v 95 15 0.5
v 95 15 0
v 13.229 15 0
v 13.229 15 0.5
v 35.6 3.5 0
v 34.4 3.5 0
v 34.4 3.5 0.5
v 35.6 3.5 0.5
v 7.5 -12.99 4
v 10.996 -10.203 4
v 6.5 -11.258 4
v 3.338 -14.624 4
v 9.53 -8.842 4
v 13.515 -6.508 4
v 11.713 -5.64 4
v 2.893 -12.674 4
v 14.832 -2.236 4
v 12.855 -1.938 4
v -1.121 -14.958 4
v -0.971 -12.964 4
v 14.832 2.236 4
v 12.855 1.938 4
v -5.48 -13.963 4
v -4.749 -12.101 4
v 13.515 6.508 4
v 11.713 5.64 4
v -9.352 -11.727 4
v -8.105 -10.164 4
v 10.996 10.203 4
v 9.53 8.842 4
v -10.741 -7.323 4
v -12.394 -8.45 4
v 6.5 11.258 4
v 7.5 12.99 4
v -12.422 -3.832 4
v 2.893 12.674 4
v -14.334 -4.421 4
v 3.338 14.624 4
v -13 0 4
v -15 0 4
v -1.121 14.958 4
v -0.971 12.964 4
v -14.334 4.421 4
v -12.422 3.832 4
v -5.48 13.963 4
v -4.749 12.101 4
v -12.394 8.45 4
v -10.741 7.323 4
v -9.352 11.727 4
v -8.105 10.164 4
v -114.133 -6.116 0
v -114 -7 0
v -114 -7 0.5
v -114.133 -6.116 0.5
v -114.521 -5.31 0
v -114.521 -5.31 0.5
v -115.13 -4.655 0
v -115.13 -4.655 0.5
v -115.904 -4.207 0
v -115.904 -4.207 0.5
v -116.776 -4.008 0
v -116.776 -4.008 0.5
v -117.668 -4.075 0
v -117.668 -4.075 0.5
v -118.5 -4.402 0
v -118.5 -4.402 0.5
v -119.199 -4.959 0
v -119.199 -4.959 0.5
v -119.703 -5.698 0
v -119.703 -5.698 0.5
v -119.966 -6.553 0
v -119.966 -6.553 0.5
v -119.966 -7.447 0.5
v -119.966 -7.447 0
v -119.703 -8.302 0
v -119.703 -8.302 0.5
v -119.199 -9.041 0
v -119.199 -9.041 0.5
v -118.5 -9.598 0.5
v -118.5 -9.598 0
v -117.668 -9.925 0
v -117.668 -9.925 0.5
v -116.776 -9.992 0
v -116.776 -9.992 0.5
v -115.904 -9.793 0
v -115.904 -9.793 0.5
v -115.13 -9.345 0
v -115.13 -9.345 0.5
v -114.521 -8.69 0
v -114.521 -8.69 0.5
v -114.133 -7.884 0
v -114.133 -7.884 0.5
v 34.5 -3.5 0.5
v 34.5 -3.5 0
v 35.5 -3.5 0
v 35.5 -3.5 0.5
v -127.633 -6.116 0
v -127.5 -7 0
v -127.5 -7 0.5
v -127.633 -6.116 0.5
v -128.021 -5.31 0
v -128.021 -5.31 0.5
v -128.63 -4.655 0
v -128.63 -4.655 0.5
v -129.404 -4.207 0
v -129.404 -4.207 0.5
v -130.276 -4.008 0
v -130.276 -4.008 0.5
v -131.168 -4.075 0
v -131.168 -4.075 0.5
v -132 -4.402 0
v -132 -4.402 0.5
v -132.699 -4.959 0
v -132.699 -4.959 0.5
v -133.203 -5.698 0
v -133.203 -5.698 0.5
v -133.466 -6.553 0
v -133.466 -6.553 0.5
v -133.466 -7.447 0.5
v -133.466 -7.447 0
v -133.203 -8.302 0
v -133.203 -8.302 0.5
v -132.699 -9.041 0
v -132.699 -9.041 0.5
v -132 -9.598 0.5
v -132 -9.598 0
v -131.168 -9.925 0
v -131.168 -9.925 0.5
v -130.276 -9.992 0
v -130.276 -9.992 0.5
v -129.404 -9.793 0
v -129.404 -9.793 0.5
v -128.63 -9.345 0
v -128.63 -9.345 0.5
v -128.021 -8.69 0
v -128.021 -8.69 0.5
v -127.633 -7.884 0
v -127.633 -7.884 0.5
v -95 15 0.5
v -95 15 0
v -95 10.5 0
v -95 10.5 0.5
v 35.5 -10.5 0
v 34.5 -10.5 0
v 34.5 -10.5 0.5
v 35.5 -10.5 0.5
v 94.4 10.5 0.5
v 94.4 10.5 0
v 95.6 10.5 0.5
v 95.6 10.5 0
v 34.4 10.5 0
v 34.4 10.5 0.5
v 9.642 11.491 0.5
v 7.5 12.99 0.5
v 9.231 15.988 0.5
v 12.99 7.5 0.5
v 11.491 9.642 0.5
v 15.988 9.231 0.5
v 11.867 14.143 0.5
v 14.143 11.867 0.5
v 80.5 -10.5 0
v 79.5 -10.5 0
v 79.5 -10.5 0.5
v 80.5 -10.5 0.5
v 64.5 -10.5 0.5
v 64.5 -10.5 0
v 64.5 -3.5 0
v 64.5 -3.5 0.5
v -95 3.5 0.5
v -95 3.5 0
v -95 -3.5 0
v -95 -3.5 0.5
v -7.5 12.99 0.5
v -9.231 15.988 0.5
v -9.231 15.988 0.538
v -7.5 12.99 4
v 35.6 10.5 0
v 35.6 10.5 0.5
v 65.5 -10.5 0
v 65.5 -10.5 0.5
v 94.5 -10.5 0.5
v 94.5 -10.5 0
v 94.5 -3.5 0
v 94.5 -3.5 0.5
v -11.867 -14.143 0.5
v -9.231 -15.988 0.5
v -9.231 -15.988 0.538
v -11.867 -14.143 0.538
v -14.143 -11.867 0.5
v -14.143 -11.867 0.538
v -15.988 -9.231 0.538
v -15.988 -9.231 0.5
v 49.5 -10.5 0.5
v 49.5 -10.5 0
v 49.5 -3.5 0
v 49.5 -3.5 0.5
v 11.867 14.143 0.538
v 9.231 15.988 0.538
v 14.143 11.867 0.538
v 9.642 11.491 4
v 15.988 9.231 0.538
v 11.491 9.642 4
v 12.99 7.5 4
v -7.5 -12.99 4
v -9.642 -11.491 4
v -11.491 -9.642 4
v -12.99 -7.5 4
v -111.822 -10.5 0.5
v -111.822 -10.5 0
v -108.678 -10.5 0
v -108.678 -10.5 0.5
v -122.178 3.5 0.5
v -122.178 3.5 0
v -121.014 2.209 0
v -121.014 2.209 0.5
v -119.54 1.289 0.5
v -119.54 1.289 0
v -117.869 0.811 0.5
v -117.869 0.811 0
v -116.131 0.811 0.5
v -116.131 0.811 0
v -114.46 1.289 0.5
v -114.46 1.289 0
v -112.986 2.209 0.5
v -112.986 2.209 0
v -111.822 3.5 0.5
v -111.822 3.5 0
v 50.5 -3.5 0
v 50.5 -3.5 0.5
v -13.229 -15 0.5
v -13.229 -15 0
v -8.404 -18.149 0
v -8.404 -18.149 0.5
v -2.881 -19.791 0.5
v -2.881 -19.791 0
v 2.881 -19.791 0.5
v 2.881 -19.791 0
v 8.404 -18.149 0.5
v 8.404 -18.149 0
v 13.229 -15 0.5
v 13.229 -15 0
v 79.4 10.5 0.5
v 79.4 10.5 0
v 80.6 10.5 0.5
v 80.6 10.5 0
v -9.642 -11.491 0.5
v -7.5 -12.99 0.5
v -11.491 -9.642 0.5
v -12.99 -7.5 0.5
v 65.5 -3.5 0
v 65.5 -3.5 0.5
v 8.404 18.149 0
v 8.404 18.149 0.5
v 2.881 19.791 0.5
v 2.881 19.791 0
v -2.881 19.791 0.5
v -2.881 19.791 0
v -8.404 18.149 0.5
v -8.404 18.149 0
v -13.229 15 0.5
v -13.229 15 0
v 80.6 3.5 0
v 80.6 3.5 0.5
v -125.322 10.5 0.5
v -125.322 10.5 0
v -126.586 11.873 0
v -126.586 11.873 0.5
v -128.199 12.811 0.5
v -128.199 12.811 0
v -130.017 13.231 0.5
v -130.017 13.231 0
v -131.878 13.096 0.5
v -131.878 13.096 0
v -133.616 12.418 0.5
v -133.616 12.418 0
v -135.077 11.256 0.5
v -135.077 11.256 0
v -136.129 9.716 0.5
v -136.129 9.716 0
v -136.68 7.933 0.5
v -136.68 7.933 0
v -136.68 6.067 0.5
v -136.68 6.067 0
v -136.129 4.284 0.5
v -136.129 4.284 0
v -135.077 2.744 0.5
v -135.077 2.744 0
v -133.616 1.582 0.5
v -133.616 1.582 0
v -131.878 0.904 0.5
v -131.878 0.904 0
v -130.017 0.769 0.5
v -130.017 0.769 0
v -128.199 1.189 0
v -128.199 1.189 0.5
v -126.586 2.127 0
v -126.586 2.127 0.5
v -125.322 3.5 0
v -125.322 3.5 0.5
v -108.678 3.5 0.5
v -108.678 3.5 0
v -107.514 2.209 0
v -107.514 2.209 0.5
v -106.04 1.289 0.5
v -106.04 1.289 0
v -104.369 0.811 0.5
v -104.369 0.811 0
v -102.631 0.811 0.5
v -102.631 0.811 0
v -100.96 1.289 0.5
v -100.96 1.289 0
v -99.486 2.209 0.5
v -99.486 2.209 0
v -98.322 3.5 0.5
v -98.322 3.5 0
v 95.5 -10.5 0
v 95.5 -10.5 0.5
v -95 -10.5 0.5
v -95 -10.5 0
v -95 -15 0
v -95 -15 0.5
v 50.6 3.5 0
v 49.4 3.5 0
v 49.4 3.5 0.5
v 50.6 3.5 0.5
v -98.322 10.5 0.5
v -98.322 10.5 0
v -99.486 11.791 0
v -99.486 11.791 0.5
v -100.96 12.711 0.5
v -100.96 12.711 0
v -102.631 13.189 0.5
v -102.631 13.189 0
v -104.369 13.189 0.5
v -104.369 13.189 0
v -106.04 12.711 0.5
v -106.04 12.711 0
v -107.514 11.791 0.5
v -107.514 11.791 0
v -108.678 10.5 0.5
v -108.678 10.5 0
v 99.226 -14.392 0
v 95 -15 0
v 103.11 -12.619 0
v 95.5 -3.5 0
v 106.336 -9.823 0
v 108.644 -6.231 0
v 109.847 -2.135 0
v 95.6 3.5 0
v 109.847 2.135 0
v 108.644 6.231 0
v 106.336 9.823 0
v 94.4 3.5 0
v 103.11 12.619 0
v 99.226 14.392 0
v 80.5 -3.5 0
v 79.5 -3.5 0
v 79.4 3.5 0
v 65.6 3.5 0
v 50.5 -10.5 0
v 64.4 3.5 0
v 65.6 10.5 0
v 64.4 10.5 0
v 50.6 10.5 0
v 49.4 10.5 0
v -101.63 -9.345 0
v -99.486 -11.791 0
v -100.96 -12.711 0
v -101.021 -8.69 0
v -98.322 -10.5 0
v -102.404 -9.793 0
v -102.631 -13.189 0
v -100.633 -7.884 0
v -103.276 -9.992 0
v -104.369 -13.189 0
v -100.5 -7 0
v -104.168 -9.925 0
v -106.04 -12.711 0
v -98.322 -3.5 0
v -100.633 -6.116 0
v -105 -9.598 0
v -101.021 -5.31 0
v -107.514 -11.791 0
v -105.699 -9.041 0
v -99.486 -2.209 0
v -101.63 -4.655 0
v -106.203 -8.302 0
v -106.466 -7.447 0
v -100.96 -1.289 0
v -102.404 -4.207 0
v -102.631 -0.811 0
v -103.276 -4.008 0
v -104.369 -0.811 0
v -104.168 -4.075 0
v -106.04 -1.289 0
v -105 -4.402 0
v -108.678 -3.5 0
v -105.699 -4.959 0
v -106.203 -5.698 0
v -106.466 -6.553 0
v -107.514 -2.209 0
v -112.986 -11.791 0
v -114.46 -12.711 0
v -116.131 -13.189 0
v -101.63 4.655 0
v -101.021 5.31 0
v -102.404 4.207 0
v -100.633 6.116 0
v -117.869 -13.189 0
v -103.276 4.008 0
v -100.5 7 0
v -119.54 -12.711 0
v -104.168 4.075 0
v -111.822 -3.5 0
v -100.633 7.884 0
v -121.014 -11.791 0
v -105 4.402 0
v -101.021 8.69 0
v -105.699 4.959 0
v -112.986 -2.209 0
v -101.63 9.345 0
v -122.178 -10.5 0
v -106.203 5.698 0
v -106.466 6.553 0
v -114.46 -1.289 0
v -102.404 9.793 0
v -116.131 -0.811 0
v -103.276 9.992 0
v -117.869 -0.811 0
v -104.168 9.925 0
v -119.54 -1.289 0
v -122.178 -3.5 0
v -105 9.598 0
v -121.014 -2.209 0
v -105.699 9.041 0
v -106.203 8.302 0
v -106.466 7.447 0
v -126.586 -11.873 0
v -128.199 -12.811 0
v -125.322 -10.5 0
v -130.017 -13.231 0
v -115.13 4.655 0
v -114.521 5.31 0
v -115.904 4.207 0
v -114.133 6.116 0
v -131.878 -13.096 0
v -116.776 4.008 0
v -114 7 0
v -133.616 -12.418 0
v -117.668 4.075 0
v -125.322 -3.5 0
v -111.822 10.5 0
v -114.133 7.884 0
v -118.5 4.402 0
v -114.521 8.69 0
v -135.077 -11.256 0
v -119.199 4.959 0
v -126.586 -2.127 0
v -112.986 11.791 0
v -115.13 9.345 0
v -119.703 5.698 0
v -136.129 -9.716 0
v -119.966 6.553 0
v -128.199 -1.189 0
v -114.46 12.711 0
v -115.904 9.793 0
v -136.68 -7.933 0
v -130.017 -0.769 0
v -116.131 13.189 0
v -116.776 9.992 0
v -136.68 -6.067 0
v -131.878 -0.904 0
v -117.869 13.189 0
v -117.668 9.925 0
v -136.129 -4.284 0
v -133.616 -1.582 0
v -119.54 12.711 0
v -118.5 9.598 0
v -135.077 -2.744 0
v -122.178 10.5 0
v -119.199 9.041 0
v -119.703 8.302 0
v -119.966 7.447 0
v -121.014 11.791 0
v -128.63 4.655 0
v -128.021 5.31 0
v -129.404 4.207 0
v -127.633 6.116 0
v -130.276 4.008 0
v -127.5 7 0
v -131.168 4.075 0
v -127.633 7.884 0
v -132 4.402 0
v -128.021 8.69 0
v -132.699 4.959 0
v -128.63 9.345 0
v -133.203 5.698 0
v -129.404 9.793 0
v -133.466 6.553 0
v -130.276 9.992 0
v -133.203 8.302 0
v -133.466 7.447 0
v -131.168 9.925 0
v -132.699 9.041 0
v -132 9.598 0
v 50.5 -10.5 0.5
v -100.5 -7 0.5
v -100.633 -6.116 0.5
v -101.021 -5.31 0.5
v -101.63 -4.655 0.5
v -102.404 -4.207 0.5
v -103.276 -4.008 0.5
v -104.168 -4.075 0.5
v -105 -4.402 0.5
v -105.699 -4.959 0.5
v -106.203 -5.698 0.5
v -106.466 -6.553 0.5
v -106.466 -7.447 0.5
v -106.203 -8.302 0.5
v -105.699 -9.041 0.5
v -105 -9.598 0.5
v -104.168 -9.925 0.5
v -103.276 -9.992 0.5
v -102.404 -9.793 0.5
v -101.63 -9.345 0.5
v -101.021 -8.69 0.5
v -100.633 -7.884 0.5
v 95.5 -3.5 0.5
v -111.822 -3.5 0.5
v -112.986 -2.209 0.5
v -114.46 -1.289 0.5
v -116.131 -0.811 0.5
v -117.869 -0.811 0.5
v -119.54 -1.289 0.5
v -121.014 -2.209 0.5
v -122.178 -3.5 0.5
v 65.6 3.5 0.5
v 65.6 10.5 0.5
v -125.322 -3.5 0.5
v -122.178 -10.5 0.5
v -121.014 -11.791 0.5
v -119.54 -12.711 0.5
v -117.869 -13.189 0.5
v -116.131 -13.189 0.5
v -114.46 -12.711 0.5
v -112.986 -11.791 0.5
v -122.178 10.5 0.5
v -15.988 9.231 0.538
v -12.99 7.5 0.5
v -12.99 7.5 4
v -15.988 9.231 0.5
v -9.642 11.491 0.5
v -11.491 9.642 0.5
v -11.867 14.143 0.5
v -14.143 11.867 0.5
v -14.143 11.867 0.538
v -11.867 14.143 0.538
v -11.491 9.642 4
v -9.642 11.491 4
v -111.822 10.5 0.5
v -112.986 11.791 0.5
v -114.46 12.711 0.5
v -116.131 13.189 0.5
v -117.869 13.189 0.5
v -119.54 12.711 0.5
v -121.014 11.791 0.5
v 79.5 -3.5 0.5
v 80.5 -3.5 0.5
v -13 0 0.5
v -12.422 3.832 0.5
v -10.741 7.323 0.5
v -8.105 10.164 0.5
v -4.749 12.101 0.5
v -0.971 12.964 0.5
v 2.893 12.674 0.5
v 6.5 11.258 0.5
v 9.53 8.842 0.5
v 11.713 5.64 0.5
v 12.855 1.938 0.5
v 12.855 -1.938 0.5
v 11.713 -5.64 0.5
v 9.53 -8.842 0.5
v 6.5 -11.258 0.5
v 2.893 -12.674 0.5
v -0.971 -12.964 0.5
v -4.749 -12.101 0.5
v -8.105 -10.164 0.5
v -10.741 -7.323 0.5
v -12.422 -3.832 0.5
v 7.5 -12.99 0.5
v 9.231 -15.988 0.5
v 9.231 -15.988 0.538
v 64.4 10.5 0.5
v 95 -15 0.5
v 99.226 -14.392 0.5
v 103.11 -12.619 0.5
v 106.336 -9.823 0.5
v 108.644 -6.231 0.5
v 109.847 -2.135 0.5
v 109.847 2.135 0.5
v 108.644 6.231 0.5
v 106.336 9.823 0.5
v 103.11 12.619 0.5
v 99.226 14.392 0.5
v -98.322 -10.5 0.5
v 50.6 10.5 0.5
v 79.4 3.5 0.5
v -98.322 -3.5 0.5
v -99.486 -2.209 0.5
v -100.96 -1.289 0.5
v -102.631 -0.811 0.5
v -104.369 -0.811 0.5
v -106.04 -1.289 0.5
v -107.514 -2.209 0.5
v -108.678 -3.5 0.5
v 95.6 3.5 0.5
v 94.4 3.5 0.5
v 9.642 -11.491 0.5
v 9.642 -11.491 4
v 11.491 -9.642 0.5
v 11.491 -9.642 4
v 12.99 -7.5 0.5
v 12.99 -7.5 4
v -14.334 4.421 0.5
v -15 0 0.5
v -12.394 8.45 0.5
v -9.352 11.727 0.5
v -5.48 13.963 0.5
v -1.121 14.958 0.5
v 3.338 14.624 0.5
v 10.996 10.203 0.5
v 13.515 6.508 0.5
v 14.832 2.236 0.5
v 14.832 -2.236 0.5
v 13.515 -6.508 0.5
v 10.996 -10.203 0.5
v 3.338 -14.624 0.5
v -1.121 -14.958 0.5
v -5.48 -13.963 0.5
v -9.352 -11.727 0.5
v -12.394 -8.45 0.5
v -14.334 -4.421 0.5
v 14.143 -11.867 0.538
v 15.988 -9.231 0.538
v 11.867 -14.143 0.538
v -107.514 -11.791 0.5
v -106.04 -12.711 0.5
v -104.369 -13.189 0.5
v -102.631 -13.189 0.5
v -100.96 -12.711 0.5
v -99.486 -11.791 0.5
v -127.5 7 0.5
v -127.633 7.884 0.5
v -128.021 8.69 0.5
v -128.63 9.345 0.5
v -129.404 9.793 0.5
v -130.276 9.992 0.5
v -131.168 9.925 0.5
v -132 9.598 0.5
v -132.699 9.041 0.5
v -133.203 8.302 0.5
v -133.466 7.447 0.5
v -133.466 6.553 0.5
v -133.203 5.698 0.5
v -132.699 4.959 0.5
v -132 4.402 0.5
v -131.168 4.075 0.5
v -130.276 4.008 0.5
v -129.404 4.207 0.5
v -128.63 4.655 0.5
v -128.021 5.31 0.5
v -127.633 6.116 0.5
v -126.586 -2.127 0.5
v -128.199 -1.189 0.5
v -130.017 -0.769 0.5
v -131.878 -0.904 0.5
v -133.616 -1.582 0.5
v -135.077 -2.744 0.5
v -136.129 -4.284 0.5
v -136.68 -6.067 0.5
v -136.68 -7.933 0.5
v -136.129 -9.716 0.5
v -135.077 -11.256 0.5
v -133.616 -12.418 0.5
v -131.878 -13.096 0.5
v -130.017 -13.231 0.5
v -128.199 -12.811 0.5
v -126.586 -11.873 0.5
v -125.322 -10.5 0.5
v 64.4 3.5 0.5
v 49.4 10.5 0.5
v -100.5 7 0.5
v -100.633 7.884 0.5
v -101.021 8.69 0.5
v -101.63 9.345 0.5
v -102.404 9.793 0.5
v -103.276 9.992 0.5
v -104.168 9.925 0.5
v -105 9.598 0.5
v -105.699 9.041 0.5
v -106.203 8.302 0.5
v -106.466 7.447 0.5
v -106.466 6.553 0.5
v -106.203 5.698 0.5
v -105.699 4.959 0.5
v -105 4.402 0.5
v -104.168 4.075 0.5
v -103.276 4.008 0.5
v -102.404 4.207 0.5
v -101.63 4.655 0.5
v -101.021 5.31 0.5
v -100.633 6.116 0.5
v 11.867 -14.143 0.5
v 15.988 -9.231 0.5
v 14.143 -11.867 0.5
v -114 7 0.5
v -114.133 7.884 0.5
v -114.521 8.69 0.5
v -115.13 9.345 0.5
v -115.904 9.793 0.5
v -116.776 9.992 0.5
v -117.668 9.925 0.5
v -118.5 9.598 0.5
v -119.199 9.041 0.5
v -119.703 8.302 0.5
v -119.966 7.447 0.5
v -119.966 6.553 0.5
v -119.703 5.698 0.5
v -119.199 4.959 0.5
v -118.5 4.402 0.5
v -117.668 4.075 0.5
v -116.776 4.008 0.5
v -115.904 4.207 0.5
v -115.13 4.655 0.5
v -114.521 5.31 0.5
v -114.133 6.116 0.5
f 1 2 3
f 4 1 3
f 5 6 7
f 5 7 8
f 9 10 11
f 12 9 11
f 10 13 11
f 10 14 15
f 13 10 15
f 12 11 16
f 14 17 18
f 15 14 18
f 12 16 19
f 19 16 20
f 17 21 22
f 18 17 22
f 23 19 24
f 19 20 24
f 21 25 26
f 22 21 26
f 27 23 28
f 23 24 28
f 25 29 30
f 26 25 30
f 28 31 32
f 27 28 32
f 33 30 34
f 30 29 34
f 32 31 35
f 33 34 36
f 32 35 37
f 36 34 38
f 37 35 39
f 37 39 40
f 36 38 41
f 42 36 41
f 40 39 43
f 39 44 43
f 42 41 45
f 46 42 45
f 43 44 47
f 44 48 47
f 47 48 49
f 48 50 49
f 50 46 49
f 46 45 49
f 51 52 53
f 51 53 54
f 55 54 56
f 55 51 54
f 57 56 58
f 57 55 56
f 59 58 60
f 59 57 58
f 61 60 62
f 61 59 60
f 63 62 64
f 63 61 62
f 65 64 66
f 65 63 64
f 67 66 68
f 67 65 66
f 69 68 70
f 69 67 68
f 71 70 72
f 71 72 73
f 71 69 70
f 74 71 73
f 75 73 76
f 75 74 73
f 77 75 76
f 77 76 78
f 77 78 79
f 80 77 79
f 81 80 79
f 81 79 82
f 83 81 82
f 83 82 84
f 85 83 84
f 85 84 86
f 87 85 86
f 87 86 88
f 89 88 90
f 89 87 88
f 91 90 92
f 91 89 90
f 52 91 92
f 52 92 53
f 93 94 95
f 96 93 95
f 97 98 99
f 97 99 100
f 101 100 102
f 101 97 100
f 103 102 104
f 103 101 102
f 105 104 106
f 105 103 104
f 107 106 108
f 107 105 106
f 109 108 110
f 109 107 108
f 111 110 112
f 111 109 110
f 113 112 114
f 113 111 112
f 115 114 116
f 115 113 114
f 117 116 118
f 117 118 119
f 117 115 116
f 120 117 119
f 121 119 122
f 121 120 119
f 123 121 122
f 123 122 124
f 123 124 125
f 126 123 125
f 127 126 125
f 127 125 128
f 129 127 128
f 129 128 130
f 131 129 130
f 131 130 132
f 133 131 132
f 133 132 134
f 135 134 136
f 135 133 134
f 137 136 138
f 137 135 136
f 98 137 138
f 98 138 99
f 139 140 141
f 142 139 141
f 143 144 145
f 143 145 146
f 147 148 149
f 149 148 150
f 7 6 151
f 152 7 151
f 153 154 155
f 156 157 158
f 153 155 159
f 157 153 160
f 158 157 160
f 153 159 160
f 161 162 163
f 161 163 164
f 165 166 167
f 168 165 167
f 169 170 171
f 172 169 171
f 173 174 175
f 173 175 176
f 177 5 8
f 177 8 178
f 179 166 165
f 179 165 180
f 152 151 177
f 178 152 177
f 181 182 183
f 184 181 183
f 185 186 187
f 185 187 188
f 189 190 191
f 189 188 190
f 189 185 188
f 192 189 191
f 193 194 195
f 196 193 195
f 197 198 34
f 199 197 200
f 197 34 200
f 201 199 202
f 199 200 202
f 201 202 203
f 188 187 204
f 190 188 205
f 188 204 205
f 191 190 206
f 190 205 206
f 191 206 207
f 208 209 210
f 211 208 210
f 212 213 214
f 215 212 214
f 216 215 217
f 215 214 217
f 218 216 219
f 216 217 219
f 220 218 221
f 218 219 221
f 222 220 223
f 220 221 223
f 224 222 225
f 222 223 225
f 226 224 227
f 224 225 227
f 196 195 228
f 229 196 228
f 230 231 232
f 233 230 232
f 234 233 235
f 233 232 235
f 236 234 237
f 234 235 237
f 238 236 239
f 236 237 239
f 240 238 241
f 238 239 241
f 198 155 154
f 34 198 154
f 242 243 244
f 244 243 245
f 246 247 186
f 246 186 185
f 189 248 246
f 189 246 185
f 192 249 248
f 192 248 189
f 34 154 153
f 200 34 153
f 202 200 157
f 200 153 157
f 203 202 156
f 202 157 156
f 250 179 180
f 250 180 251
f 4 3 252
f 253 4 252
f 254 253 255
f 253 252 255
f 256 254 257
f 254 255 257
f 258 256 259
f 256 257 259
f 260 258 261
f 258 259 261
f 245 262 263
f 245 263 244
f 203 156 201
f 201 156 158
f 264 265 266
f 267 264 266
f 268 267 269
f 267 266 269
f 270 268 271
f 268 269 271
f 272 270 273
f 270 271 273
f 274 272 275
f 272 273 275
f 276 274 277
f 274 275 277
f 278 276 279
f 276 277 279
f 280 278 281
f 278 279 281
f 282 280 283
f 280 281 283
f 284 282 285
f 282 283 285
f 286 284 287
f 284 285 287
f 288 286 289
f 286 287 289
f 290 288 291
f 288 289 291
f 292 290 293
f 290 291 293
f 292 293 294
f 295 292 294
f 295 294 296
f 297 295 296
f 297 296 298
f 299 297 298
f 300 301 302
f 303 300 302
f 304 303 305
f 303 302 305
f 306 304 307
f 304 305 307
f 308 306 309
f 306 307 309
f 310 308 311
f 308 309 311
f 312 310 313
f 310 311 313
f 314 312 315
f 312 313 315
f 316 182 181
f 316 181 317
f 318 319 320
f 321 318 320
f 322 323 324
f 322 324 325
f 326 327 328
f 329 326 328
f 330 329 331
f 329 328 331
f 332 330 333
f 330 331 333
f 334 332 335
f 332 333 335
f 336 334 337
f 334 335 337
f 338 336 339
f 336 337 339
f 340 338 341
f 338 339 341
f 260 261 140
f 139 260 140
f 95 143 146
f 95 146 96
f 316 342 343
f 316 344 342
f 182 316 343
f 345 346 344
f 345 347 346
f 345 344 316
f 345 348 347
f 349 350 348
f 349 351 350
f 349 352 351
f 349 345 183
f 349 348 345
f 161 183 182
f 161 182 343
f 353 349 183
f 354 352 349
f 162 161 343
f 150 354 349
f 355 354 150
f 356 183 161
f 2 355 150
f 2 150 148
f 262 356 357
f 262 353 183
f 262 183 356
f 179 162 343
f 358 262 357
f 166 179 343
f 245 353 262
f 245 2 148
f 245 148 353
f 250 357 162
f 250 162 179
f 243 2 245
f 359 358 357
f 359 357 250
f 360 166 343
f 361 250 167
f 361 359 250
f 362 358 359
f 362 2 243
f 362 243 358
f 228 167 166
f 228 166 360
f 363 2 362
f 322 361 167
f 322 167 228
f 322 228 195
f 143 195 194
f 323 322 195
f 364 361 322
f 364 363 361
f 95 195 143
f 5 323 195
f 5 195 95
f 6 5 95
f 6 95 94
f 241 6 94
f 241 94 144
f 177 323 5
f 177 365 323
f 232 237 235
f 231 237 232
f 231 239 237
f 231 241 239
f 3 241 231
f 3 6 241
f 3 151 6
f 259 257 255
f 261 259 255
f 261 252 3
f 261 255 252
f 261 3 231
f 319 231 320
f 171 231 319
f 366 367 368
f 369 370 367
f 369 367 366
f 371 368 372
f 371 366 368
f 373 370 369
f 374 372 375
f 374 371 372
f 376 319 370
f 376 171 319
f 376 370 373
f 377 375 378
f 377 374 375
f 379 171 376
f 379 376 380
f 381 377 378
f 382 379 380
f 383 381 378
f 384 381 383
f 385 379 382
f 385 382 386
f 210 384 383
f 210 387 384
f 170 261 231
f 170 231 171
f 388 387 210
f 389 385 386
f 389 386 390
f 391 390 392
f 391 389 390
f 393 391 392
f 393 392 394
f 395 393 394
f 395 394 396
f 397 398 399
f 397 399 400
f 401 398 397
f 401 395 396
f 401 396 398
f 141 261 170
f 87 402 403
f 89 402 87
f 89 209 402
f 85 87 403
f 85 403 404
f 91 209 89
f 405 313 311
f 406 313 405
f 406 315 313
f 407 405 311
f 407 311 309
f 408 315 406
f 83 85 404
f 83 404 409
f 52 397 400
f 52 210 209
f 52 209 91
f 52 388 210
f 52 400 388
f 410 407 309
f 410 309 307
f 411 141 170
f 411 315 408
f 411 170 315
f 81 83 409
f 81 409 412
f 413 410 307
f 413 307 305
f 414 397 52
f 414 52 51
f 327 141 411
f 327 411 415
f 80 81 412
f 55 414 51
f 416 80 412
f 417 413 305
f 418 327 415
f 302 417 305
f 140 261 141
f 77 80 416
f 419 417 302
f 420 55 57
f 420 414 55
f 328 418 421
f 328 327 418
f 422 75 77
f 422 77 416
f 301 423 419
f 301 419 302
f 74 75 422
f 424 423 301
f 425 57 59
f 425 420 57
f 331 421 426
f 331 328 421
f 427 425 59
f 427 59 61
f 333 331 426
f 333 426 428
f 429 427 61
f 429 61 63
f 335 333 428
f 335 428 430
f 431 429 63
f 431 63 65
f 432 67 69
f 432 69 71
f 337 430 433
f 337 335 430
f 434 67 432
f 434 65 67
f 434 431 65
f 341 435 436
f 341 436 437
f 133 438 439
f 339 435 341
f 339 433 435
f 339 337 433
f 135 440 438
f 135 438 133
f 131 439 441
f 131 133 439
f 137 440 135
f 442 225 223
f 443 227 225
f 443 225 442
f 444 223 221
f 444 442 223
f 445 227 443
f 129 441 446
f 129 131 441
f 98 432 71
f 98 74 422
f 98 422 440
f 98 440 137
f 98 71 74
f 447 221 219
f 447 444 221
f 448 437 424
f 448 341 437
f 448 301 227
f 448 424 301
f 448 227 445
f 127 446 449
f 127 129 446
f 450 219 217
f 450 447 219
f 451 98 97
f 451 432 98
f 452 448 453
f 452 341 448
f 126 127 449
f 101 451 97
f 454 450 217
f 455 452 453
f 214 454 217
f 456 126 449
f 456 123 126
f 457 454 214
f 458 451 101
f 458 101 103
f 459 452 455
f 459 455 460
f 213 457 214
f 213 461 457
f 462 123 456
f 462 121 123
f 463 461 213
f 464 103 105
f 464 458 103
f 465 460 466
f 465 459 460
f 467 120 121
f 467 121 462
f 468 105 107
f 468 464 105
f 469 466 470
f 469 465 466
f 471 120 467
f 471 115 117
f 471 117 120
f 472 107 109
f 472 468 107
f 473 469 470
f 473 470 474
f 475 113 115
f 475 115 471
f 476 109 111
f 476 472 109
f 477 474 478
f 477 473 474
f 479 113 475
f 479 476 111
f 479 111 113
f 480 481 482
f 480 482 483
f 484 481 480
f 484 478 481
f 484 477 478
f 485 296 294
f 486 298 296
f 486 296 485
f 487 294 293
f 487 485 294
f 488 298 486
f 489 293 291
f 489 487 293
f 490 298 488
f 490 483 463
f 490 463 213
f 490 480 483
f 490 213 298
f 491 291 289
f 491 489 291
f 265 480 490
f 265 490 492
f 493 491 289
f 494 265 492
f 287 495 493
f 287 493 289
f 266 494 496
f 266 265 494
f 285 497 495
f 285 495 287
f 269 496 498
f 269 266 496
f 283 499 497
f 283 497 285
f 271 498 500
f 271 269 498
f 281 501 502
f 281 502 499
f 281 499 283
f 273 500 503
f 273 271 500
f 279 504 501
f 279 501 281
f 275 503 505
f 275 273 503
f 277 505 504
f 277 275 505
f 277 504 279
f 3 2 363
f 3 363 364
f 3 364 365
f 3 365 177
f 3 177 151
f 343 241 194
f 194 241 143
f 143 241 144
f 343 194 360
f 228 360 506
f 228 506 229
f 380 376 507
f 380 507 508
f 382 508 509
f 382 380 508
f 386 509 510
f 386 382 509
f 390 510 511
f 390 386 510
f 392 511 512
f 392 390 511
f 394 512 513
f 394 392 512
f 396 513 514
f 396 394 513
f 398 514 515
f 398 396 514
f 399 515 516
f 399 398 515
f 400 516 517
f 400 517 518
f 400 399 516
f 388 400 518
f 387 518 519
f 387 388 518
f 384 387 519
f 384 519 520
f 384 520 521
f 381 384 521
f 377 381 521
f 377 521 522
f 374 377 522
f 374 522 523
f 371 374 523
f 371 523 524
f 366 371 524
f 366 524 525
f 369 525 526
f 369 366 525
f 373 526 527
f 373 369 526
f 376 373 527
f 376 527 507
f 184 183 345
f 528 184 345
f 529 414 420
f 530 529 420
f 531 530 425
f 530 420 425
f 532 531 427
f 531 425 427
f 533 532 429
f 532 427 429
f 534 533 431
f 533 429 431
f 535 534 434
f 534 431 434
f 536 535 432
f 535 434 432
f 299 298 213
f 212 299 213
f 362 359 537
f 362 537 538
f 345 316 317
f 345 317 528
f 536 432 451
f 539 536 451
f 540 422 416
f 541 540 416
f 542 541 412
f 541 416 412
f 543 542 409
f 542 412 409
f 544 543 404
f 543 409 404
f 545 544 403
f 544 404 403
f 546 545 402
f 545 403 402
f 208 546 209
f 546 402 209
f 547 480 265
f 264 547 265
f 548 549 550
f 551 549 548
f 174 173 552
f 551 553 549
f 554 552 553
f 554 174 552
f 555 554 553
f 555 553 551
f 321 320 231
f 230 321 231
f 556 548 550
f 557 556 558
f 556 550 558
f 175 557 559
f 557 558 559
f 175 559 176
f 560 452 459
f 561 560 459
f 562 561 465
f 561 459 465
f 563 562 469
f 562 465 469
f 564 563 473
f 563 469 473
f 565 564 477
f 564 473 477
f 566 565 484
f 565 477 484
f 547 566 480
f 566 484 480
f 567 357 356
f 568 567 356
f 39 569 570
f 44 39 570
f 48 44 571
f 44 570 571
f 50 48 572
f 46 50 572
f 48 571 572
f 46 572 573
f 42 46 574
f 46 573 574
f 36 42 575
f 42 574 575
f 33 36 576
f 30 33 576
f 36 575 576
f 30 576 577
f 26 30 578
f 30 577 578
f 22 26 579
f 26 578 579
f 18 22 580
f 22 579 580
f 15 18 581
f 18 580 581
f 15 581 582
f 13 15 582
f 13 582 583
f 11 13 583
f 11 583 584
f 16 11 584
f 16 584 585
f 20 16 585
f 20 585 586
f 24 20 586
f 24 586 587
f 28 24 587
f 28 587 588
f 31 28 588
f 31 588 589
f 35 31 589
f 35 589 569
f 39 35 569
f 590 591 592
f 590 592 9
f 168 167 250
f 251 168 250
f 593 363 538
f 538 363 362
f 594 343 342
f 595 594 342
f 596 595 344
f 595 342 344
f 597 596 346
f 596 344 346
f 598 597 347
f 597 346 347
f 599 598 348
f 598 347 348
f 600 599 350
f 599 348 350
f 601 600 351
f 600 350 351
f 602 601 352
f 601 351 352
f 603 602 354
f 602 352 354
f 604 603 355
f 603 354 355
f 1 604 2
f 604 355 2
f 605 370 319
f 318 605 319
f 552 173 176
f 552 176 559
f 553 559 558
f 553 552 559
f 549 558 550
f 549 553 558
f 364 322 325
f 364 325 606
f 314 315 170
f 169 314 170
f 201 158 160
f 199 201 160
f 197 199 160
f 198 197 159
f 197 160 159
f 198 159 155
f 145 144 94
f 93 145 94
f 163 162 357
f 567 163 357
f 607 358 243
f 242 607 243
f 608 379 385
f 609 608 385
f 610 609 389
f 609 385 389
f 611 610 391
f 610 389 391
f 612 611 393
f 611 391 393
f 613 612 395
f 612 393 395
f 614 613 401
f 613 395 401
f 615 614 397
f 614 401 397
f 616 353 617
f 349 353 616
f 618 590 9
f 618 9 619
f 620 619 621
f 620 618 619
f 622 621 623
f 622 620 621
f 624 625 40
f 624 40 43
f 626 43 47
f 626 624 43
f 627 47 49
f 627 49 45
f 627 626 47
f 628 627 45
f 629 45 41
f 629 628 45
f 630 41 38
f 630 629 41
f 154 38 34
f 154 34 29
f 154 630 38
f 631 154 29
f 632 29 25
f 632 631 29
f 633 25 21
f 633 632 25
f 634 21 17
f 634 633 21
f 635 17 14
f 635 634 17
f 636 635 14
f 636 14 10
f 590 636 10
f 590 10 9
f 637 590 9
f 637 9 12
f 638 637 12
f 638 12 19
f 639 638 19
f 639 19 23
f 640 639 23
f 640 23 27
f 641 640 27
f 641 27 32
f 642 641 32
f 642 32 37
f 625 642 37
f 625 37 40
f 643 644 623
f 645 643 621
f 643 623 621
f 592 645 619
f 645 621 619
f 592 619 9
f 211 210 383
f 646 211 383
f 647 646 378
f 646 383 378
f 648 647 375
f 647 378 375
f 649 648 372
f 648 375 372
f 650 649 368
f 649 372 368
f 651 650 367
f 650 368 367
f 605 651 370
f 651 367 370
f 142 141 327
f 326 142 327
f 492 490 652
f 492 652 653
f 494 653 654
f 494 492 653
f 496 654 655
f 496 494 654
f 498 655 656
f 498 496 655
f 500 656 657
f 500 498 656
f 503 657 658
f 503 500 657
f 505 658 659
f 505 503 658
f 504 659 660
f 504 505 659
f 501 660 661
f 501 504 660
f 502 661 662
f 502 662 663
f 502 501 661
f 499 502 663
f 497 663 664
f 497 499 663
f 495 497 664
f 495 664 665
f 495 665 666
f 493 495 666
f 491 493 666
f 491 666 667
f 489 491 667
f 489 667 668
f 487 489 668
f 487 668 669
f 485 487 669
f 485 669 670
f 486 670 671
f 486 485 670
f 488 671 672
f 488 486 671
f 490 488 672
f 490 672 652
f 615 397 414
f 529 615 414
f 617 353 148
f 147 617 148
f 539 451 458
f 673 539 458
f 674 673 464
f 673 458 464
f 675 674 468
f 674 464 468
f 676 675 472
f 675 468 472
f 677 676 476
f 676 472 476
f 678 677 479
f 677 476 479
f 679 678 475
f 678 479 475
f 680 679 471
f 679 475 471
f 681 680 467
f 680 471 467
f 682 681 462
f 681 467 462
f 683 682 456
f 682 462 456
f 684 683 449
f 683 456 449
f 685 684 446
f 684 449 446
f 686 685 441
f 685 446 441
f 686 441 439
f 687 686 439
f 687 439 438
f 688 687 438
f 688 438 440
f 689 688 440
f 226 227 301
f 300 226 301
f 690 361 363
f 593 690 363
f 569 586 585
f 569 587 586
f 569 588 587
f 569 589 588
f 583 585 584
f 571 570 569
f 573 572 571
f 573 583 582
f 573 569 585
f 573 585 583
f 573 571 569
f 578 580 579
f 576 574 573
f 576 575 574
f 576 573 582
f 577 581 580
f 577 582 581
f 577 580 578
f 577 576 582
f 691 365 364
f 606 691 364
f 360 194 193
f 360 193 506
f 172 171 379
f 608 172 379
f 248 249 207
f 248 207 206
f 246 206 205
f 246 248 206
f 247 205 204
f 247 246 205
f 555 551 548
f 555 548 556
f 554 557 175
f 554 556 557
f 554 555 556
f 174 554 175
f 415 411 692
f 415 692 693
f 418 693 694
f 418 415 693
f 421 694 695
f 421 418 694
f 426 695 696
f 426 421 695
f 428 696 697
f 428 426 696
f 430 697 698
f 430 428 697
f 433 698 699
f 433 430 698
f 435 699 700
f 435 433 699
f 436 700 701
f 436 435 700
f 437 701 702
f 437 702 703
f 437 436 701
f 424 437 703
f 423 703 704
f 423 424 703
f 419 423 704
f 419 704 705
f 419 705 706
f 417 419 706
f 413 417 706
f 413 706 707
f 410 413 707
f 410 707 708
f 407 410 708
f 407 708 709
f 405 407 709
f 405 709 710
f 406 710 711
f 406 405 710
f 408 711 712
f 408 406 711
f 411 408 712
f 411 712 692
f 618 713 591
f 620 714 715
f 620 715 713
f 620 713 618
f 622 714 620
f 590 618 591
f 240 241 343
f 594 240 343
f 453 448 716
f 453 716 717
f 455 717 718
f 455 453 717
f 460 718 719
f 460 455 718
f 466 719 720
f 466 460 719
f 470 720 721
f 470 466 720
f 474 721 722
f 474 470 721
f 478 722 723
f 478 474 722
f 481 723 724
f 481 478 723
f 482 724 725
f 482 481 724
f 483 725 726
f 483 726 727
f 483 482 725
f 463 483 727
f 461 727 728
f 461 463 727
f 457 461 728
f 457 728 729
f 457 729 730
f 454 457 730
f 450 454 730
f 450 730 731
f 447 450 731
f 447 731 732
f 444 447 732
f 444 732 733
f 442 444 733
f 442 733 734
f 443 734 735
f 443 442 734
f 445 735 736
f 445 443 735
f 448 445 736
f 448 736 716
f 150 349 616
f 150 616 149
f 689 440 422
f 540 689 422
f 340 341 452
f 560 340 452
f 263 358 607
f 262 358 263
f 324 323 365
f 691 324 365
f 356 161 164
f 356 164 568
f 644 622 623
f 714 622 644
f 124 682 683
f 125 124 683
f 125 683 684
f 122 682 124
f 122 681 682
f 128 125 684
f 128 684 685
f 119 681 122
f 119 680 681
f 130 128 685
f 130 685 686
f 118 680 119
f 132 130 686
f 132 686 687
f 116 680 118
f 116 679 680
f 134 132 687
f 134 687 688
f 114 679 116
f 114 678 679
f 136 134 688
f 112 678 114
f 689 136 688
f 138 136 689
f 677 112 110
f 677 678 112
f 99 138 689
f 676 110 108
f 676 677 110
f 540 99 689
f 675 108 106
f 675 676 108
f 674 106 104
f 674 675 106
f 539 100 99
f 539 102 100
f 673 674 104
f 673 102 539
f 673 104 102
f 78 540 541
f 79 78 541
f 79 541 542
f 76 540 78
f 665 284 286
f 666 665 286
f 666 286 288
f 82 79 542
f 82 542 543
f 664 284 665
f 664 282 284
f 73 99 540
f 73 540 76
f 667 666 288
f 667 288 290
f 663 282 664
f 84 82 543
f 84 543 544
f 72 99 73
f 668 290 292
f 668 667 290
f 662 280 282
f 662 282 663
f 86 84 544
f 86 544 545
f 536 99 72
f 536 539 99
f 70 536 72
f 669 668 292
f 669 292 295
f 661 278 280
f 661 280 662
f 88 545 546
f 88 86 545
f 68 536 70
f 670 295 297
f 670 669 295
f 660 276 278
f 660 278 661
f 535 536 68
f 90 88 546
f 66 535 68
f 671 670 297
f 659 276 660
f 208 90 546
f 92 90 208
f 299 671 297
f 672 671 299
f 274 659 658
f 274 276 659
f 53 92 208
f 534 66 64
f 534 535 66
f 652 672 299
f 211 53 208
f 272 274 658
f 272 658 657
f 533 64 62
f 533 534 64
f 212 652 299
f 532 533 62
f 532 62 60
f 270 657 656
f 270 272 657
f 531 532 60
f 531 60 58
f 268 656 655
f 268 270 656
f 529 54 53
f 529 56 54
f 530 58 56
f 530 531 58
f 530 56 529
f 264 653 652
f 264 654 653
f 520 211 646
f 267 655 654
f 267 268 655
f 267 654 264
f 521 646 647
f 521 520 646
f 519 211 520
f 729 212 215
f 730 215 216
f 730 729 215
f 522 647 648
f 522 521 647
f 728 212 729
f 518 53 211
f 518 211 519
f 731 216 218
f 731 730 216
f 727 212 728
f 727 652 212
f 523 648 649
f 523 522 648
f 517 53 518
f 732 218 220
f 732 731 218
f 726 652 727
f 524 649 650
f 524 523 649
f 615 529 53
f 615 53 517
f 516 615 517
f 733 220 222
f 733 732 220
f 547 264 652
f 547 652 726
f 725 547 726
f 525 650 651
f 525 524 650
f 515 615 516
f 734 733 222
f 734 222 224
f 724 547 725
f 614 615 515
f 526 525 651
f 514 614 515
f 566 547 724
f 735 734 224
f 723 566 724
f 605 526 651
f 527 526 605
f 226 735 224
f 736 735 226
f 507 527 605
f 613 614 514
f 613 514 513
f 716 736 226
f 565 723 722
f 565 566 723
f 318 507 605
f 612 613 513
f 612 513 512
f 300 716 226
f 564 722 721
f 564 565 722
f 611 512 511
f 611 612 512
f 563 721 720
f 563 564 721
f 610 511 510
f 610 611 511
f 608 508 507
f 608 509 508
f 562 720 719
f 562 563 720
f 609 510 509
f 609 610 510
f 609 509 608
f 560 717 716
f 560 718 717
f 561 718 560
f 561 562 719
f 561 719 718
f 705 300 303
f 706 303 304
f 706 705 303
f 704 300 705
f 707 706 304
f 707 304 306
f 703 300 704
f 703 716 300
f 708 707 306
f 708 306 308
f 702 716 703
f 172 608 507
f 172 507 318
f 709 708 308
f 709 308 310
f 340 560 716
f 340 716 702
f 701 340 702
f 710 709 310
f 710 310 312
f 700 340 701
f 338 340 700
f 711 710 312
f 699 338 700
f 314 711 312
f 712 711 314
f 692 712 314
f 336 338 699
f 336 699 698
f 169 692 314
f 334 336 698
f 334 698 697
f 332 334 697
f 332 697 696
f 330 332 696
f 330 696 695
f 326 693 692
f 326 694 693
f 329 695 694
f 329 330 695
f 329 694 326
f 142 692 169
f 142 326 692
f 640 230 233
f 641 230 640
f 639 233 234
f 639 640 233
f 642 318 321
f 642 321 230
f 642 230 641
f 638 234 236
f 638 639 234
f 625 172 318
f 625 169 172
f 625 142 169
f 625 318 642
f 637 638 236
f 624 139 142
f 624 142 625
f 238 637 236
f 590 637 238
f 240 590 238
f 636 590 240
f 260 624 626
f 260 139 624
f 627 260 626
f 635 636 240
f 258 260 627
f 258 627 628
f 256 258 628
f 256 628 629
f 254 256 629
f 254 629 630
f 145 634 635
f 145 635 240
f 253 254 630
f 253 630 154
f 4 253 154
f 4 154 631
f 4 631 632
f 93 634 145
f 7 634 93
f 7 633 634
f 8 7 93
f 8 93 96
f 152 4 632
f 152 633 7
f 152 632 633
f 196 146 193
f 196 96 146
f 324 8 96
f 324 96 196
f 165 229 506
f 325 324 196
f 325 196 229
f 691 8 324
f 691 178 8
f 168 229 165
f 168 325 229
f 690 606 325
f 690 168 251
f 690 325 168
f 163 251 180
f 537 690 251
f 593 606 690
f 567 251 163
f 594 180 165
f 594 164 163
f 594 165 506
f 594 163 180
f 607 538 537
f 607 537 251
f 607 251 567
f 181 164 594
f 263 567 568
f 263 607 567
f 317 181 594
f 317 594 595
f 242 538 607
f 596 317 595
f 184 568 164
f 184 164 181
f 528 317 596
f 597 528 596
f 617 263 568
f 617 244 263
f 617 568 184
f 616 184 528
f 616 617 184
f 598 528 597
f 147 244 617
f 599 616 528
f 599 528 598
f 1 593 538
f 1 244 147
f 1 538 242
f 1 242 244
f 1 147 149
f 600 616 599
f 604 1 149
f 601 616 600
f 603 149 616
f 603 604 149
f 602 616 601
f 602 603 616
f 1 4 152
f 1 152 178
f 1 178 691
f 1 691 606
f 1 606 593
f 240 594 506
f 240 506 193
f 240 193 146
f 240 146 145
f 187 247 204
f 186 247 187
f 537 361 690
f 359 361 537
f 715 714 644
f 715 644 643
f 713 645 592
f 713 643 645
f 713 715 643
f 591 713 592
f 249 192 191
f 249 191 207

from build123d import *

# Parameters (mm, degrees)
SKETCH_1_R        = 3
SKETCH_1_W        = 1
SKETCH_1_H        = 7
SKETCH_1_W_2      = 1.2
EXTRUDE_2_DEPTH   = 0.5
SKETCH_3_R        = 15
SKETCH_3_R_2      = 13
EXTRUDE_3_DEPTH   = 4
EXTRUDE_4_DEPTH   = 3.5
EXTRUDE_4_2_DEPTH = 3.5
EXTRUDE_4_3_DEPTH = 3.5
EXTRUDE_4_4_DEPTH = 3.5


with BuildPart() as part:
    # Эскиз1 → Бобышка-Вытянуть2 (new body)
    with BuildSketch(Plane.XY):
        with BuildLine():
            Line((95, 15), (13.228756555, 15))
            ThreePointArc((13.228756555, 15), (0, 20), (-13.228756555, 15))
            Line((-13.228756555, 15), (-95, 15))
            Line((-95, 15), (-95, 10.5))
            Line((-95, 10.5), (-98.321921206, 10.5))
            ThreePointArc((-98.321921206, 10.5), (-103.5, 13.25), (-108.678078794, 10.5))
            Line((-108.678078794, 10.5), (-111.821921206, 10.5))
            ThreePointArc((-111.821921206, 10.5), (-117, 13.25), (-122.178078794, 10.5))
            Line((-122.178078794, 10.5), (-125.321921206, 10.5))
            ThreePointArc((-125.321921206, 10.5), (-136.75, 7), (-125.321921206, 3.5))
            Line((-125.321921206, 3.5), (-122.178078794, 3.5))
            ThreePointArc((-122.178078794, 3.5), (-117, 0.75), (-111.821921206, 3.5))
            Line((-111.821921206, 3.5), (-108.678078794, 3.5))
            ThreePointArc((-108.678078794, 3.5), (-103.5, 0.75), (-98.321921206, 3.5))
            Line((-98.321921206, 3.5), (-95, 3.5))
            Line((-95, 3.5), (-95, -3.5))
            Line((-95, -3.5), (-98.321921206, -3.5))
            ThreePointArc((-98.321921206, -3.5), (-103.5, -0.75), (-108.678078794, -3.5))
            Line((-108.678078794, -3.5), (-111.821921206, -3.5))
            ThreePointArc((-111.821921206, -3.5), (-117, -0.75), (-122.178078794, -3.5))
            Line((-122.178078794, -3.5), (-125.321921206, -3.5))
            ThreePointArc((-125.321921206, -3.5), (-136.75, -7), (-125.321921206, -10.5))
            Line((-125.321921206, -10.5), (-122.178078794, -10.5))
            ThreePointArc((-122.178078794, -10.5), (-117, -13.25), (-111.821921206, -10.5))
            Line((-111.821921206, -10.5), (-108.678078794, -10.5))
            ThreePointArc((-108.678078794, -10.5), (-103.5, -13.25), (-98.321921206, -10.5))
            Line((-98.321921206, -10.5), (-95, -10.5))
            Line((-95, -10.5), (-95, -15))
            Line((-95, -15), (-13.228756555, -15))
            ThreePointArc((-13.228756555, -15), (0, -20), (13.228756555, -15))
            Line((13.228756555, -15), (95, -15))
            ThreePointArc((95, -15), (110, 0), (95, 15))
        make_face()
        with Locations((-130.5, -7)):
            Circle(SKETCH_1_R, mode=Mode.SUBTRACT)
        with Locations((-117, -7)):
            Circle(SKETCH_1_R, mode=Mode.SUBTRACT)
        with Locations((-103.5, -7)):
            Circle(SKETCH_1_R, mode=Mode.SUBTRACT)
        with Locations((35, -7)):
            Rectangle(SKETCH_1_W, SKETCH_1_H, mode=Mode.SUBTRACT)
        with Locations((50, -7)):
            Rectangle(SKETCH_1_W, SKETCH_1_H, mode=Mode.SUBTRACT)
        with Locations((65, -7)):
            Rectangle(SKETCH_1_W, SKETCH_1_H, mode=Mode.SUBTRACT)
        with Locations((80, -7)):
            Rectangle(SKETCH_1_W, SKETCH_1_H, mode=Mode.SUBTRACT)
        with Locations((95, -7)):
            Rectangle(SKETCH_1_W, SKETCH_1_H, mode=Mode.SUBTRACT)
        with Locations((-130.5, 7)):
            Circle(SKETCH_1_R, mode=Mode.SUBTRACT)
        with Locations((-117, 7)):
            Circle(SKETCH_1_R, mode=Mode.SUBTRACT)
        with Locations((-103.5, 7)):
            Circle(SKETCH_1_R, mode=Mode.SUBTRACT)
        with Locations((35, 7)):
            Rectangle(SKETCH_1_W_2, SKETCH_1_H, mode=Mode.SUBTRACT)
        with Locations((50, 7)):
            Rectangle(SKETCH_1_W_2, SKETCH_1_H, mode=Mode.SUBTRACT)
        with Locations((65, 7)):
            Rectangle(SKETCH_1_W_2, SKETCH_1_H, mode=Mode.SUBTRACT)
        with Locations((80, 7)):
            Rectangle(SKETCH_1_W_2, SKETCH_1_H, mode=Mode.SUBTRACT)
        with Locations((95, 7)):
            Rectangle(SKETCH_1_W_2, SKETCH_1_H, mode=Mode.SUBTRACT)
    extrude(amount=EXTRUDE_2_DEPTH)

    # Эскиз3 → Бобышка-Вытянуть3 (add)
    with BuildSketch(Plane(origin=(0, 0, 0), x_dir=(-1, 0, 0), z_dir=(0, 0, -1))):
        Circle(SKETCH_3_R)
        Circle(SKETCH_3_R_2, mode=Mode.SUBTRACT)
    extrude(amount=-EXTRUDE_3_DEPTH)


with BuildPart() as body_2:
    # Эскиз8 → Бобышка-Вытянуть4 (new body)
    with BuildSketch(Plane.XY.offset(0.5)):
        with BuildLine():
            Line((12.990381057, 7.5), (15.988424537, 9.23092121))
            ThreePointArc((15.988424537, 9.23092121), (13.054493969, 13.054493969), (9.23092121, 15.988424537))
            Line((9.23092121, 15.988424537), (7.5, 12.990381057))
            ThreePointArc((7.5, 12.990381057), (10.606601718, 10.606601718), (12.990381057, 7.5))
        make_face()
    extrude(amount=EXTRUDE_4_DEPTH)


with BuildPart() as body_3:
    # Эскиз8 → Extrude 4 2 (new body)
    with BuildSketch(Plane.XY.offset(0.5)):
        with BuildLine():
            ThreePointArc((7.5, -12.990381057), (10.606601718, -10.606601718), (12.990381057, -7.5))
            Line((12.990381057, -7.5), (15.988424537, -9.23092121))
            ThreePointArc((15.988424537, -9.23092121), (13.054493969, -13.054493969), (9.23092121, -15.988424537))
            Line((9.23092121, -15.988424537), (7.5, -12.990381057))
        make_face()
    extrude(amount=EXTRUDE_4_2_DEPTH)


with BuildPart() as body_4:
    # Эскиз8 → Extrude 4 3 (new body)
    with BuildSketch(Plane.XY.offset(0.5)):
        with BuildLine():
            ThreePointArc((-12.990381057, -7.5), (-10.606601718, -10.606601718), (-7.5, -12.990381057))
            Line((-7.5, -12.990381057), (-9.23092121, -15.988424537))
            ThreePointArc((-9.23092121, -15.988424537), (-13.054493969, -13.054493969), (-15.988424537, -9.23092121))
            Line((-15.988424537, -9.23092121), (-12.990381057, -7.5))
        make_face()
    extrude(amount=EXTRUDE_4_3_DEPTH)


with BuildPart() as body_5:
    # Эскиз8 → Extrude 4 4 (new body)
    with BuildSketch(Plane.XY.offset(0.5)):
        with BuildLine():
            ThreePointArc((-7.5, 12.990381057), (-10.606601718, 10.606601718), (-12.990381057, 7.5))
            Line((-12.990381057, 7.5), (-15.988424537, 9.23092121))
            ThreePointArc((-15.988424537, 9.23092121), (-13.054493969, 13.054493969), (-9.23092121, 15.988424537))
            Line((-9.23092121, 15.988424537), (-7.5, 12.990381057))
        make_face()
    extrude(amount=EXTRUDE_4_4_DEPTH)


with BuildPart() as sweep_1_tool:
    # Вырез-По траектории1: sweep along a curve in space
    with BuildLine() as sweep_1_path:
        ThreePointArc((-13, 0, 4), (-9.192388155, 9.192388155, 4), (0, 13, 4))
        ThreePointArc((0, 13, 4), (9.192388155, 9.192388155, 4), (13, 0, 4))
        ThreePointArc((13, 0, 4), (9.192388155, -9.192388155, 4), (0, -13, 4))
        ThreePointArc((0, -13, 4), (-9.192388155, -9.192388155, 4), (-13, 0, 4))
    # Sketch 2 → Вырез-По траектории1 (sweep)
    with BuildSketch(Plane(origin=(17.656340523, 5.523009727, 0.5), x_dir=(-0.6752443953624955, -0.2098714313406492, 0.7071060661870786), z_dir=(-0.29872202469959164, 0.9543380466699508, -0.0020111284293495265))):
        Polygon((0, 0), (4.949752473, 0), (2.474881242, 2.474876237), align=None)
    sweep(path=sweep_1_path.line)


with BuildPart() as body_2_1:
    add(body_2.part)

    # Вырез-По траектории1: cut by sweep_1_tool
    add(sweep_1_tool.part, mode=Mode.SUBTRACT)


with BuildPart() as body_3_1:
    add(body_3.part)

    # Вырез-По траектории1: cut by sweep_1_tool
    add(sweep_1_tool.part, mode=Mode.SUBTRACT)


with BuildPart() as body_4_1:
    add(body_4.part)

    # Вырез-По траектории1: cut by sweep_1_tool
    add(sweep_1_tool.part, mode=Mode.SUBTRACT)


with BuildPart() as body_5_1:
    add(body_5.part)

    # Вырез-По траектории1: cut by sweep_1_tool
    add(sweep_1_tool.part, mode=Mode.SUBTRACT)


solid = Compound([part.part, body_2_1.part, body_3_1.part, body_4_1.part, body_5_1.part])
